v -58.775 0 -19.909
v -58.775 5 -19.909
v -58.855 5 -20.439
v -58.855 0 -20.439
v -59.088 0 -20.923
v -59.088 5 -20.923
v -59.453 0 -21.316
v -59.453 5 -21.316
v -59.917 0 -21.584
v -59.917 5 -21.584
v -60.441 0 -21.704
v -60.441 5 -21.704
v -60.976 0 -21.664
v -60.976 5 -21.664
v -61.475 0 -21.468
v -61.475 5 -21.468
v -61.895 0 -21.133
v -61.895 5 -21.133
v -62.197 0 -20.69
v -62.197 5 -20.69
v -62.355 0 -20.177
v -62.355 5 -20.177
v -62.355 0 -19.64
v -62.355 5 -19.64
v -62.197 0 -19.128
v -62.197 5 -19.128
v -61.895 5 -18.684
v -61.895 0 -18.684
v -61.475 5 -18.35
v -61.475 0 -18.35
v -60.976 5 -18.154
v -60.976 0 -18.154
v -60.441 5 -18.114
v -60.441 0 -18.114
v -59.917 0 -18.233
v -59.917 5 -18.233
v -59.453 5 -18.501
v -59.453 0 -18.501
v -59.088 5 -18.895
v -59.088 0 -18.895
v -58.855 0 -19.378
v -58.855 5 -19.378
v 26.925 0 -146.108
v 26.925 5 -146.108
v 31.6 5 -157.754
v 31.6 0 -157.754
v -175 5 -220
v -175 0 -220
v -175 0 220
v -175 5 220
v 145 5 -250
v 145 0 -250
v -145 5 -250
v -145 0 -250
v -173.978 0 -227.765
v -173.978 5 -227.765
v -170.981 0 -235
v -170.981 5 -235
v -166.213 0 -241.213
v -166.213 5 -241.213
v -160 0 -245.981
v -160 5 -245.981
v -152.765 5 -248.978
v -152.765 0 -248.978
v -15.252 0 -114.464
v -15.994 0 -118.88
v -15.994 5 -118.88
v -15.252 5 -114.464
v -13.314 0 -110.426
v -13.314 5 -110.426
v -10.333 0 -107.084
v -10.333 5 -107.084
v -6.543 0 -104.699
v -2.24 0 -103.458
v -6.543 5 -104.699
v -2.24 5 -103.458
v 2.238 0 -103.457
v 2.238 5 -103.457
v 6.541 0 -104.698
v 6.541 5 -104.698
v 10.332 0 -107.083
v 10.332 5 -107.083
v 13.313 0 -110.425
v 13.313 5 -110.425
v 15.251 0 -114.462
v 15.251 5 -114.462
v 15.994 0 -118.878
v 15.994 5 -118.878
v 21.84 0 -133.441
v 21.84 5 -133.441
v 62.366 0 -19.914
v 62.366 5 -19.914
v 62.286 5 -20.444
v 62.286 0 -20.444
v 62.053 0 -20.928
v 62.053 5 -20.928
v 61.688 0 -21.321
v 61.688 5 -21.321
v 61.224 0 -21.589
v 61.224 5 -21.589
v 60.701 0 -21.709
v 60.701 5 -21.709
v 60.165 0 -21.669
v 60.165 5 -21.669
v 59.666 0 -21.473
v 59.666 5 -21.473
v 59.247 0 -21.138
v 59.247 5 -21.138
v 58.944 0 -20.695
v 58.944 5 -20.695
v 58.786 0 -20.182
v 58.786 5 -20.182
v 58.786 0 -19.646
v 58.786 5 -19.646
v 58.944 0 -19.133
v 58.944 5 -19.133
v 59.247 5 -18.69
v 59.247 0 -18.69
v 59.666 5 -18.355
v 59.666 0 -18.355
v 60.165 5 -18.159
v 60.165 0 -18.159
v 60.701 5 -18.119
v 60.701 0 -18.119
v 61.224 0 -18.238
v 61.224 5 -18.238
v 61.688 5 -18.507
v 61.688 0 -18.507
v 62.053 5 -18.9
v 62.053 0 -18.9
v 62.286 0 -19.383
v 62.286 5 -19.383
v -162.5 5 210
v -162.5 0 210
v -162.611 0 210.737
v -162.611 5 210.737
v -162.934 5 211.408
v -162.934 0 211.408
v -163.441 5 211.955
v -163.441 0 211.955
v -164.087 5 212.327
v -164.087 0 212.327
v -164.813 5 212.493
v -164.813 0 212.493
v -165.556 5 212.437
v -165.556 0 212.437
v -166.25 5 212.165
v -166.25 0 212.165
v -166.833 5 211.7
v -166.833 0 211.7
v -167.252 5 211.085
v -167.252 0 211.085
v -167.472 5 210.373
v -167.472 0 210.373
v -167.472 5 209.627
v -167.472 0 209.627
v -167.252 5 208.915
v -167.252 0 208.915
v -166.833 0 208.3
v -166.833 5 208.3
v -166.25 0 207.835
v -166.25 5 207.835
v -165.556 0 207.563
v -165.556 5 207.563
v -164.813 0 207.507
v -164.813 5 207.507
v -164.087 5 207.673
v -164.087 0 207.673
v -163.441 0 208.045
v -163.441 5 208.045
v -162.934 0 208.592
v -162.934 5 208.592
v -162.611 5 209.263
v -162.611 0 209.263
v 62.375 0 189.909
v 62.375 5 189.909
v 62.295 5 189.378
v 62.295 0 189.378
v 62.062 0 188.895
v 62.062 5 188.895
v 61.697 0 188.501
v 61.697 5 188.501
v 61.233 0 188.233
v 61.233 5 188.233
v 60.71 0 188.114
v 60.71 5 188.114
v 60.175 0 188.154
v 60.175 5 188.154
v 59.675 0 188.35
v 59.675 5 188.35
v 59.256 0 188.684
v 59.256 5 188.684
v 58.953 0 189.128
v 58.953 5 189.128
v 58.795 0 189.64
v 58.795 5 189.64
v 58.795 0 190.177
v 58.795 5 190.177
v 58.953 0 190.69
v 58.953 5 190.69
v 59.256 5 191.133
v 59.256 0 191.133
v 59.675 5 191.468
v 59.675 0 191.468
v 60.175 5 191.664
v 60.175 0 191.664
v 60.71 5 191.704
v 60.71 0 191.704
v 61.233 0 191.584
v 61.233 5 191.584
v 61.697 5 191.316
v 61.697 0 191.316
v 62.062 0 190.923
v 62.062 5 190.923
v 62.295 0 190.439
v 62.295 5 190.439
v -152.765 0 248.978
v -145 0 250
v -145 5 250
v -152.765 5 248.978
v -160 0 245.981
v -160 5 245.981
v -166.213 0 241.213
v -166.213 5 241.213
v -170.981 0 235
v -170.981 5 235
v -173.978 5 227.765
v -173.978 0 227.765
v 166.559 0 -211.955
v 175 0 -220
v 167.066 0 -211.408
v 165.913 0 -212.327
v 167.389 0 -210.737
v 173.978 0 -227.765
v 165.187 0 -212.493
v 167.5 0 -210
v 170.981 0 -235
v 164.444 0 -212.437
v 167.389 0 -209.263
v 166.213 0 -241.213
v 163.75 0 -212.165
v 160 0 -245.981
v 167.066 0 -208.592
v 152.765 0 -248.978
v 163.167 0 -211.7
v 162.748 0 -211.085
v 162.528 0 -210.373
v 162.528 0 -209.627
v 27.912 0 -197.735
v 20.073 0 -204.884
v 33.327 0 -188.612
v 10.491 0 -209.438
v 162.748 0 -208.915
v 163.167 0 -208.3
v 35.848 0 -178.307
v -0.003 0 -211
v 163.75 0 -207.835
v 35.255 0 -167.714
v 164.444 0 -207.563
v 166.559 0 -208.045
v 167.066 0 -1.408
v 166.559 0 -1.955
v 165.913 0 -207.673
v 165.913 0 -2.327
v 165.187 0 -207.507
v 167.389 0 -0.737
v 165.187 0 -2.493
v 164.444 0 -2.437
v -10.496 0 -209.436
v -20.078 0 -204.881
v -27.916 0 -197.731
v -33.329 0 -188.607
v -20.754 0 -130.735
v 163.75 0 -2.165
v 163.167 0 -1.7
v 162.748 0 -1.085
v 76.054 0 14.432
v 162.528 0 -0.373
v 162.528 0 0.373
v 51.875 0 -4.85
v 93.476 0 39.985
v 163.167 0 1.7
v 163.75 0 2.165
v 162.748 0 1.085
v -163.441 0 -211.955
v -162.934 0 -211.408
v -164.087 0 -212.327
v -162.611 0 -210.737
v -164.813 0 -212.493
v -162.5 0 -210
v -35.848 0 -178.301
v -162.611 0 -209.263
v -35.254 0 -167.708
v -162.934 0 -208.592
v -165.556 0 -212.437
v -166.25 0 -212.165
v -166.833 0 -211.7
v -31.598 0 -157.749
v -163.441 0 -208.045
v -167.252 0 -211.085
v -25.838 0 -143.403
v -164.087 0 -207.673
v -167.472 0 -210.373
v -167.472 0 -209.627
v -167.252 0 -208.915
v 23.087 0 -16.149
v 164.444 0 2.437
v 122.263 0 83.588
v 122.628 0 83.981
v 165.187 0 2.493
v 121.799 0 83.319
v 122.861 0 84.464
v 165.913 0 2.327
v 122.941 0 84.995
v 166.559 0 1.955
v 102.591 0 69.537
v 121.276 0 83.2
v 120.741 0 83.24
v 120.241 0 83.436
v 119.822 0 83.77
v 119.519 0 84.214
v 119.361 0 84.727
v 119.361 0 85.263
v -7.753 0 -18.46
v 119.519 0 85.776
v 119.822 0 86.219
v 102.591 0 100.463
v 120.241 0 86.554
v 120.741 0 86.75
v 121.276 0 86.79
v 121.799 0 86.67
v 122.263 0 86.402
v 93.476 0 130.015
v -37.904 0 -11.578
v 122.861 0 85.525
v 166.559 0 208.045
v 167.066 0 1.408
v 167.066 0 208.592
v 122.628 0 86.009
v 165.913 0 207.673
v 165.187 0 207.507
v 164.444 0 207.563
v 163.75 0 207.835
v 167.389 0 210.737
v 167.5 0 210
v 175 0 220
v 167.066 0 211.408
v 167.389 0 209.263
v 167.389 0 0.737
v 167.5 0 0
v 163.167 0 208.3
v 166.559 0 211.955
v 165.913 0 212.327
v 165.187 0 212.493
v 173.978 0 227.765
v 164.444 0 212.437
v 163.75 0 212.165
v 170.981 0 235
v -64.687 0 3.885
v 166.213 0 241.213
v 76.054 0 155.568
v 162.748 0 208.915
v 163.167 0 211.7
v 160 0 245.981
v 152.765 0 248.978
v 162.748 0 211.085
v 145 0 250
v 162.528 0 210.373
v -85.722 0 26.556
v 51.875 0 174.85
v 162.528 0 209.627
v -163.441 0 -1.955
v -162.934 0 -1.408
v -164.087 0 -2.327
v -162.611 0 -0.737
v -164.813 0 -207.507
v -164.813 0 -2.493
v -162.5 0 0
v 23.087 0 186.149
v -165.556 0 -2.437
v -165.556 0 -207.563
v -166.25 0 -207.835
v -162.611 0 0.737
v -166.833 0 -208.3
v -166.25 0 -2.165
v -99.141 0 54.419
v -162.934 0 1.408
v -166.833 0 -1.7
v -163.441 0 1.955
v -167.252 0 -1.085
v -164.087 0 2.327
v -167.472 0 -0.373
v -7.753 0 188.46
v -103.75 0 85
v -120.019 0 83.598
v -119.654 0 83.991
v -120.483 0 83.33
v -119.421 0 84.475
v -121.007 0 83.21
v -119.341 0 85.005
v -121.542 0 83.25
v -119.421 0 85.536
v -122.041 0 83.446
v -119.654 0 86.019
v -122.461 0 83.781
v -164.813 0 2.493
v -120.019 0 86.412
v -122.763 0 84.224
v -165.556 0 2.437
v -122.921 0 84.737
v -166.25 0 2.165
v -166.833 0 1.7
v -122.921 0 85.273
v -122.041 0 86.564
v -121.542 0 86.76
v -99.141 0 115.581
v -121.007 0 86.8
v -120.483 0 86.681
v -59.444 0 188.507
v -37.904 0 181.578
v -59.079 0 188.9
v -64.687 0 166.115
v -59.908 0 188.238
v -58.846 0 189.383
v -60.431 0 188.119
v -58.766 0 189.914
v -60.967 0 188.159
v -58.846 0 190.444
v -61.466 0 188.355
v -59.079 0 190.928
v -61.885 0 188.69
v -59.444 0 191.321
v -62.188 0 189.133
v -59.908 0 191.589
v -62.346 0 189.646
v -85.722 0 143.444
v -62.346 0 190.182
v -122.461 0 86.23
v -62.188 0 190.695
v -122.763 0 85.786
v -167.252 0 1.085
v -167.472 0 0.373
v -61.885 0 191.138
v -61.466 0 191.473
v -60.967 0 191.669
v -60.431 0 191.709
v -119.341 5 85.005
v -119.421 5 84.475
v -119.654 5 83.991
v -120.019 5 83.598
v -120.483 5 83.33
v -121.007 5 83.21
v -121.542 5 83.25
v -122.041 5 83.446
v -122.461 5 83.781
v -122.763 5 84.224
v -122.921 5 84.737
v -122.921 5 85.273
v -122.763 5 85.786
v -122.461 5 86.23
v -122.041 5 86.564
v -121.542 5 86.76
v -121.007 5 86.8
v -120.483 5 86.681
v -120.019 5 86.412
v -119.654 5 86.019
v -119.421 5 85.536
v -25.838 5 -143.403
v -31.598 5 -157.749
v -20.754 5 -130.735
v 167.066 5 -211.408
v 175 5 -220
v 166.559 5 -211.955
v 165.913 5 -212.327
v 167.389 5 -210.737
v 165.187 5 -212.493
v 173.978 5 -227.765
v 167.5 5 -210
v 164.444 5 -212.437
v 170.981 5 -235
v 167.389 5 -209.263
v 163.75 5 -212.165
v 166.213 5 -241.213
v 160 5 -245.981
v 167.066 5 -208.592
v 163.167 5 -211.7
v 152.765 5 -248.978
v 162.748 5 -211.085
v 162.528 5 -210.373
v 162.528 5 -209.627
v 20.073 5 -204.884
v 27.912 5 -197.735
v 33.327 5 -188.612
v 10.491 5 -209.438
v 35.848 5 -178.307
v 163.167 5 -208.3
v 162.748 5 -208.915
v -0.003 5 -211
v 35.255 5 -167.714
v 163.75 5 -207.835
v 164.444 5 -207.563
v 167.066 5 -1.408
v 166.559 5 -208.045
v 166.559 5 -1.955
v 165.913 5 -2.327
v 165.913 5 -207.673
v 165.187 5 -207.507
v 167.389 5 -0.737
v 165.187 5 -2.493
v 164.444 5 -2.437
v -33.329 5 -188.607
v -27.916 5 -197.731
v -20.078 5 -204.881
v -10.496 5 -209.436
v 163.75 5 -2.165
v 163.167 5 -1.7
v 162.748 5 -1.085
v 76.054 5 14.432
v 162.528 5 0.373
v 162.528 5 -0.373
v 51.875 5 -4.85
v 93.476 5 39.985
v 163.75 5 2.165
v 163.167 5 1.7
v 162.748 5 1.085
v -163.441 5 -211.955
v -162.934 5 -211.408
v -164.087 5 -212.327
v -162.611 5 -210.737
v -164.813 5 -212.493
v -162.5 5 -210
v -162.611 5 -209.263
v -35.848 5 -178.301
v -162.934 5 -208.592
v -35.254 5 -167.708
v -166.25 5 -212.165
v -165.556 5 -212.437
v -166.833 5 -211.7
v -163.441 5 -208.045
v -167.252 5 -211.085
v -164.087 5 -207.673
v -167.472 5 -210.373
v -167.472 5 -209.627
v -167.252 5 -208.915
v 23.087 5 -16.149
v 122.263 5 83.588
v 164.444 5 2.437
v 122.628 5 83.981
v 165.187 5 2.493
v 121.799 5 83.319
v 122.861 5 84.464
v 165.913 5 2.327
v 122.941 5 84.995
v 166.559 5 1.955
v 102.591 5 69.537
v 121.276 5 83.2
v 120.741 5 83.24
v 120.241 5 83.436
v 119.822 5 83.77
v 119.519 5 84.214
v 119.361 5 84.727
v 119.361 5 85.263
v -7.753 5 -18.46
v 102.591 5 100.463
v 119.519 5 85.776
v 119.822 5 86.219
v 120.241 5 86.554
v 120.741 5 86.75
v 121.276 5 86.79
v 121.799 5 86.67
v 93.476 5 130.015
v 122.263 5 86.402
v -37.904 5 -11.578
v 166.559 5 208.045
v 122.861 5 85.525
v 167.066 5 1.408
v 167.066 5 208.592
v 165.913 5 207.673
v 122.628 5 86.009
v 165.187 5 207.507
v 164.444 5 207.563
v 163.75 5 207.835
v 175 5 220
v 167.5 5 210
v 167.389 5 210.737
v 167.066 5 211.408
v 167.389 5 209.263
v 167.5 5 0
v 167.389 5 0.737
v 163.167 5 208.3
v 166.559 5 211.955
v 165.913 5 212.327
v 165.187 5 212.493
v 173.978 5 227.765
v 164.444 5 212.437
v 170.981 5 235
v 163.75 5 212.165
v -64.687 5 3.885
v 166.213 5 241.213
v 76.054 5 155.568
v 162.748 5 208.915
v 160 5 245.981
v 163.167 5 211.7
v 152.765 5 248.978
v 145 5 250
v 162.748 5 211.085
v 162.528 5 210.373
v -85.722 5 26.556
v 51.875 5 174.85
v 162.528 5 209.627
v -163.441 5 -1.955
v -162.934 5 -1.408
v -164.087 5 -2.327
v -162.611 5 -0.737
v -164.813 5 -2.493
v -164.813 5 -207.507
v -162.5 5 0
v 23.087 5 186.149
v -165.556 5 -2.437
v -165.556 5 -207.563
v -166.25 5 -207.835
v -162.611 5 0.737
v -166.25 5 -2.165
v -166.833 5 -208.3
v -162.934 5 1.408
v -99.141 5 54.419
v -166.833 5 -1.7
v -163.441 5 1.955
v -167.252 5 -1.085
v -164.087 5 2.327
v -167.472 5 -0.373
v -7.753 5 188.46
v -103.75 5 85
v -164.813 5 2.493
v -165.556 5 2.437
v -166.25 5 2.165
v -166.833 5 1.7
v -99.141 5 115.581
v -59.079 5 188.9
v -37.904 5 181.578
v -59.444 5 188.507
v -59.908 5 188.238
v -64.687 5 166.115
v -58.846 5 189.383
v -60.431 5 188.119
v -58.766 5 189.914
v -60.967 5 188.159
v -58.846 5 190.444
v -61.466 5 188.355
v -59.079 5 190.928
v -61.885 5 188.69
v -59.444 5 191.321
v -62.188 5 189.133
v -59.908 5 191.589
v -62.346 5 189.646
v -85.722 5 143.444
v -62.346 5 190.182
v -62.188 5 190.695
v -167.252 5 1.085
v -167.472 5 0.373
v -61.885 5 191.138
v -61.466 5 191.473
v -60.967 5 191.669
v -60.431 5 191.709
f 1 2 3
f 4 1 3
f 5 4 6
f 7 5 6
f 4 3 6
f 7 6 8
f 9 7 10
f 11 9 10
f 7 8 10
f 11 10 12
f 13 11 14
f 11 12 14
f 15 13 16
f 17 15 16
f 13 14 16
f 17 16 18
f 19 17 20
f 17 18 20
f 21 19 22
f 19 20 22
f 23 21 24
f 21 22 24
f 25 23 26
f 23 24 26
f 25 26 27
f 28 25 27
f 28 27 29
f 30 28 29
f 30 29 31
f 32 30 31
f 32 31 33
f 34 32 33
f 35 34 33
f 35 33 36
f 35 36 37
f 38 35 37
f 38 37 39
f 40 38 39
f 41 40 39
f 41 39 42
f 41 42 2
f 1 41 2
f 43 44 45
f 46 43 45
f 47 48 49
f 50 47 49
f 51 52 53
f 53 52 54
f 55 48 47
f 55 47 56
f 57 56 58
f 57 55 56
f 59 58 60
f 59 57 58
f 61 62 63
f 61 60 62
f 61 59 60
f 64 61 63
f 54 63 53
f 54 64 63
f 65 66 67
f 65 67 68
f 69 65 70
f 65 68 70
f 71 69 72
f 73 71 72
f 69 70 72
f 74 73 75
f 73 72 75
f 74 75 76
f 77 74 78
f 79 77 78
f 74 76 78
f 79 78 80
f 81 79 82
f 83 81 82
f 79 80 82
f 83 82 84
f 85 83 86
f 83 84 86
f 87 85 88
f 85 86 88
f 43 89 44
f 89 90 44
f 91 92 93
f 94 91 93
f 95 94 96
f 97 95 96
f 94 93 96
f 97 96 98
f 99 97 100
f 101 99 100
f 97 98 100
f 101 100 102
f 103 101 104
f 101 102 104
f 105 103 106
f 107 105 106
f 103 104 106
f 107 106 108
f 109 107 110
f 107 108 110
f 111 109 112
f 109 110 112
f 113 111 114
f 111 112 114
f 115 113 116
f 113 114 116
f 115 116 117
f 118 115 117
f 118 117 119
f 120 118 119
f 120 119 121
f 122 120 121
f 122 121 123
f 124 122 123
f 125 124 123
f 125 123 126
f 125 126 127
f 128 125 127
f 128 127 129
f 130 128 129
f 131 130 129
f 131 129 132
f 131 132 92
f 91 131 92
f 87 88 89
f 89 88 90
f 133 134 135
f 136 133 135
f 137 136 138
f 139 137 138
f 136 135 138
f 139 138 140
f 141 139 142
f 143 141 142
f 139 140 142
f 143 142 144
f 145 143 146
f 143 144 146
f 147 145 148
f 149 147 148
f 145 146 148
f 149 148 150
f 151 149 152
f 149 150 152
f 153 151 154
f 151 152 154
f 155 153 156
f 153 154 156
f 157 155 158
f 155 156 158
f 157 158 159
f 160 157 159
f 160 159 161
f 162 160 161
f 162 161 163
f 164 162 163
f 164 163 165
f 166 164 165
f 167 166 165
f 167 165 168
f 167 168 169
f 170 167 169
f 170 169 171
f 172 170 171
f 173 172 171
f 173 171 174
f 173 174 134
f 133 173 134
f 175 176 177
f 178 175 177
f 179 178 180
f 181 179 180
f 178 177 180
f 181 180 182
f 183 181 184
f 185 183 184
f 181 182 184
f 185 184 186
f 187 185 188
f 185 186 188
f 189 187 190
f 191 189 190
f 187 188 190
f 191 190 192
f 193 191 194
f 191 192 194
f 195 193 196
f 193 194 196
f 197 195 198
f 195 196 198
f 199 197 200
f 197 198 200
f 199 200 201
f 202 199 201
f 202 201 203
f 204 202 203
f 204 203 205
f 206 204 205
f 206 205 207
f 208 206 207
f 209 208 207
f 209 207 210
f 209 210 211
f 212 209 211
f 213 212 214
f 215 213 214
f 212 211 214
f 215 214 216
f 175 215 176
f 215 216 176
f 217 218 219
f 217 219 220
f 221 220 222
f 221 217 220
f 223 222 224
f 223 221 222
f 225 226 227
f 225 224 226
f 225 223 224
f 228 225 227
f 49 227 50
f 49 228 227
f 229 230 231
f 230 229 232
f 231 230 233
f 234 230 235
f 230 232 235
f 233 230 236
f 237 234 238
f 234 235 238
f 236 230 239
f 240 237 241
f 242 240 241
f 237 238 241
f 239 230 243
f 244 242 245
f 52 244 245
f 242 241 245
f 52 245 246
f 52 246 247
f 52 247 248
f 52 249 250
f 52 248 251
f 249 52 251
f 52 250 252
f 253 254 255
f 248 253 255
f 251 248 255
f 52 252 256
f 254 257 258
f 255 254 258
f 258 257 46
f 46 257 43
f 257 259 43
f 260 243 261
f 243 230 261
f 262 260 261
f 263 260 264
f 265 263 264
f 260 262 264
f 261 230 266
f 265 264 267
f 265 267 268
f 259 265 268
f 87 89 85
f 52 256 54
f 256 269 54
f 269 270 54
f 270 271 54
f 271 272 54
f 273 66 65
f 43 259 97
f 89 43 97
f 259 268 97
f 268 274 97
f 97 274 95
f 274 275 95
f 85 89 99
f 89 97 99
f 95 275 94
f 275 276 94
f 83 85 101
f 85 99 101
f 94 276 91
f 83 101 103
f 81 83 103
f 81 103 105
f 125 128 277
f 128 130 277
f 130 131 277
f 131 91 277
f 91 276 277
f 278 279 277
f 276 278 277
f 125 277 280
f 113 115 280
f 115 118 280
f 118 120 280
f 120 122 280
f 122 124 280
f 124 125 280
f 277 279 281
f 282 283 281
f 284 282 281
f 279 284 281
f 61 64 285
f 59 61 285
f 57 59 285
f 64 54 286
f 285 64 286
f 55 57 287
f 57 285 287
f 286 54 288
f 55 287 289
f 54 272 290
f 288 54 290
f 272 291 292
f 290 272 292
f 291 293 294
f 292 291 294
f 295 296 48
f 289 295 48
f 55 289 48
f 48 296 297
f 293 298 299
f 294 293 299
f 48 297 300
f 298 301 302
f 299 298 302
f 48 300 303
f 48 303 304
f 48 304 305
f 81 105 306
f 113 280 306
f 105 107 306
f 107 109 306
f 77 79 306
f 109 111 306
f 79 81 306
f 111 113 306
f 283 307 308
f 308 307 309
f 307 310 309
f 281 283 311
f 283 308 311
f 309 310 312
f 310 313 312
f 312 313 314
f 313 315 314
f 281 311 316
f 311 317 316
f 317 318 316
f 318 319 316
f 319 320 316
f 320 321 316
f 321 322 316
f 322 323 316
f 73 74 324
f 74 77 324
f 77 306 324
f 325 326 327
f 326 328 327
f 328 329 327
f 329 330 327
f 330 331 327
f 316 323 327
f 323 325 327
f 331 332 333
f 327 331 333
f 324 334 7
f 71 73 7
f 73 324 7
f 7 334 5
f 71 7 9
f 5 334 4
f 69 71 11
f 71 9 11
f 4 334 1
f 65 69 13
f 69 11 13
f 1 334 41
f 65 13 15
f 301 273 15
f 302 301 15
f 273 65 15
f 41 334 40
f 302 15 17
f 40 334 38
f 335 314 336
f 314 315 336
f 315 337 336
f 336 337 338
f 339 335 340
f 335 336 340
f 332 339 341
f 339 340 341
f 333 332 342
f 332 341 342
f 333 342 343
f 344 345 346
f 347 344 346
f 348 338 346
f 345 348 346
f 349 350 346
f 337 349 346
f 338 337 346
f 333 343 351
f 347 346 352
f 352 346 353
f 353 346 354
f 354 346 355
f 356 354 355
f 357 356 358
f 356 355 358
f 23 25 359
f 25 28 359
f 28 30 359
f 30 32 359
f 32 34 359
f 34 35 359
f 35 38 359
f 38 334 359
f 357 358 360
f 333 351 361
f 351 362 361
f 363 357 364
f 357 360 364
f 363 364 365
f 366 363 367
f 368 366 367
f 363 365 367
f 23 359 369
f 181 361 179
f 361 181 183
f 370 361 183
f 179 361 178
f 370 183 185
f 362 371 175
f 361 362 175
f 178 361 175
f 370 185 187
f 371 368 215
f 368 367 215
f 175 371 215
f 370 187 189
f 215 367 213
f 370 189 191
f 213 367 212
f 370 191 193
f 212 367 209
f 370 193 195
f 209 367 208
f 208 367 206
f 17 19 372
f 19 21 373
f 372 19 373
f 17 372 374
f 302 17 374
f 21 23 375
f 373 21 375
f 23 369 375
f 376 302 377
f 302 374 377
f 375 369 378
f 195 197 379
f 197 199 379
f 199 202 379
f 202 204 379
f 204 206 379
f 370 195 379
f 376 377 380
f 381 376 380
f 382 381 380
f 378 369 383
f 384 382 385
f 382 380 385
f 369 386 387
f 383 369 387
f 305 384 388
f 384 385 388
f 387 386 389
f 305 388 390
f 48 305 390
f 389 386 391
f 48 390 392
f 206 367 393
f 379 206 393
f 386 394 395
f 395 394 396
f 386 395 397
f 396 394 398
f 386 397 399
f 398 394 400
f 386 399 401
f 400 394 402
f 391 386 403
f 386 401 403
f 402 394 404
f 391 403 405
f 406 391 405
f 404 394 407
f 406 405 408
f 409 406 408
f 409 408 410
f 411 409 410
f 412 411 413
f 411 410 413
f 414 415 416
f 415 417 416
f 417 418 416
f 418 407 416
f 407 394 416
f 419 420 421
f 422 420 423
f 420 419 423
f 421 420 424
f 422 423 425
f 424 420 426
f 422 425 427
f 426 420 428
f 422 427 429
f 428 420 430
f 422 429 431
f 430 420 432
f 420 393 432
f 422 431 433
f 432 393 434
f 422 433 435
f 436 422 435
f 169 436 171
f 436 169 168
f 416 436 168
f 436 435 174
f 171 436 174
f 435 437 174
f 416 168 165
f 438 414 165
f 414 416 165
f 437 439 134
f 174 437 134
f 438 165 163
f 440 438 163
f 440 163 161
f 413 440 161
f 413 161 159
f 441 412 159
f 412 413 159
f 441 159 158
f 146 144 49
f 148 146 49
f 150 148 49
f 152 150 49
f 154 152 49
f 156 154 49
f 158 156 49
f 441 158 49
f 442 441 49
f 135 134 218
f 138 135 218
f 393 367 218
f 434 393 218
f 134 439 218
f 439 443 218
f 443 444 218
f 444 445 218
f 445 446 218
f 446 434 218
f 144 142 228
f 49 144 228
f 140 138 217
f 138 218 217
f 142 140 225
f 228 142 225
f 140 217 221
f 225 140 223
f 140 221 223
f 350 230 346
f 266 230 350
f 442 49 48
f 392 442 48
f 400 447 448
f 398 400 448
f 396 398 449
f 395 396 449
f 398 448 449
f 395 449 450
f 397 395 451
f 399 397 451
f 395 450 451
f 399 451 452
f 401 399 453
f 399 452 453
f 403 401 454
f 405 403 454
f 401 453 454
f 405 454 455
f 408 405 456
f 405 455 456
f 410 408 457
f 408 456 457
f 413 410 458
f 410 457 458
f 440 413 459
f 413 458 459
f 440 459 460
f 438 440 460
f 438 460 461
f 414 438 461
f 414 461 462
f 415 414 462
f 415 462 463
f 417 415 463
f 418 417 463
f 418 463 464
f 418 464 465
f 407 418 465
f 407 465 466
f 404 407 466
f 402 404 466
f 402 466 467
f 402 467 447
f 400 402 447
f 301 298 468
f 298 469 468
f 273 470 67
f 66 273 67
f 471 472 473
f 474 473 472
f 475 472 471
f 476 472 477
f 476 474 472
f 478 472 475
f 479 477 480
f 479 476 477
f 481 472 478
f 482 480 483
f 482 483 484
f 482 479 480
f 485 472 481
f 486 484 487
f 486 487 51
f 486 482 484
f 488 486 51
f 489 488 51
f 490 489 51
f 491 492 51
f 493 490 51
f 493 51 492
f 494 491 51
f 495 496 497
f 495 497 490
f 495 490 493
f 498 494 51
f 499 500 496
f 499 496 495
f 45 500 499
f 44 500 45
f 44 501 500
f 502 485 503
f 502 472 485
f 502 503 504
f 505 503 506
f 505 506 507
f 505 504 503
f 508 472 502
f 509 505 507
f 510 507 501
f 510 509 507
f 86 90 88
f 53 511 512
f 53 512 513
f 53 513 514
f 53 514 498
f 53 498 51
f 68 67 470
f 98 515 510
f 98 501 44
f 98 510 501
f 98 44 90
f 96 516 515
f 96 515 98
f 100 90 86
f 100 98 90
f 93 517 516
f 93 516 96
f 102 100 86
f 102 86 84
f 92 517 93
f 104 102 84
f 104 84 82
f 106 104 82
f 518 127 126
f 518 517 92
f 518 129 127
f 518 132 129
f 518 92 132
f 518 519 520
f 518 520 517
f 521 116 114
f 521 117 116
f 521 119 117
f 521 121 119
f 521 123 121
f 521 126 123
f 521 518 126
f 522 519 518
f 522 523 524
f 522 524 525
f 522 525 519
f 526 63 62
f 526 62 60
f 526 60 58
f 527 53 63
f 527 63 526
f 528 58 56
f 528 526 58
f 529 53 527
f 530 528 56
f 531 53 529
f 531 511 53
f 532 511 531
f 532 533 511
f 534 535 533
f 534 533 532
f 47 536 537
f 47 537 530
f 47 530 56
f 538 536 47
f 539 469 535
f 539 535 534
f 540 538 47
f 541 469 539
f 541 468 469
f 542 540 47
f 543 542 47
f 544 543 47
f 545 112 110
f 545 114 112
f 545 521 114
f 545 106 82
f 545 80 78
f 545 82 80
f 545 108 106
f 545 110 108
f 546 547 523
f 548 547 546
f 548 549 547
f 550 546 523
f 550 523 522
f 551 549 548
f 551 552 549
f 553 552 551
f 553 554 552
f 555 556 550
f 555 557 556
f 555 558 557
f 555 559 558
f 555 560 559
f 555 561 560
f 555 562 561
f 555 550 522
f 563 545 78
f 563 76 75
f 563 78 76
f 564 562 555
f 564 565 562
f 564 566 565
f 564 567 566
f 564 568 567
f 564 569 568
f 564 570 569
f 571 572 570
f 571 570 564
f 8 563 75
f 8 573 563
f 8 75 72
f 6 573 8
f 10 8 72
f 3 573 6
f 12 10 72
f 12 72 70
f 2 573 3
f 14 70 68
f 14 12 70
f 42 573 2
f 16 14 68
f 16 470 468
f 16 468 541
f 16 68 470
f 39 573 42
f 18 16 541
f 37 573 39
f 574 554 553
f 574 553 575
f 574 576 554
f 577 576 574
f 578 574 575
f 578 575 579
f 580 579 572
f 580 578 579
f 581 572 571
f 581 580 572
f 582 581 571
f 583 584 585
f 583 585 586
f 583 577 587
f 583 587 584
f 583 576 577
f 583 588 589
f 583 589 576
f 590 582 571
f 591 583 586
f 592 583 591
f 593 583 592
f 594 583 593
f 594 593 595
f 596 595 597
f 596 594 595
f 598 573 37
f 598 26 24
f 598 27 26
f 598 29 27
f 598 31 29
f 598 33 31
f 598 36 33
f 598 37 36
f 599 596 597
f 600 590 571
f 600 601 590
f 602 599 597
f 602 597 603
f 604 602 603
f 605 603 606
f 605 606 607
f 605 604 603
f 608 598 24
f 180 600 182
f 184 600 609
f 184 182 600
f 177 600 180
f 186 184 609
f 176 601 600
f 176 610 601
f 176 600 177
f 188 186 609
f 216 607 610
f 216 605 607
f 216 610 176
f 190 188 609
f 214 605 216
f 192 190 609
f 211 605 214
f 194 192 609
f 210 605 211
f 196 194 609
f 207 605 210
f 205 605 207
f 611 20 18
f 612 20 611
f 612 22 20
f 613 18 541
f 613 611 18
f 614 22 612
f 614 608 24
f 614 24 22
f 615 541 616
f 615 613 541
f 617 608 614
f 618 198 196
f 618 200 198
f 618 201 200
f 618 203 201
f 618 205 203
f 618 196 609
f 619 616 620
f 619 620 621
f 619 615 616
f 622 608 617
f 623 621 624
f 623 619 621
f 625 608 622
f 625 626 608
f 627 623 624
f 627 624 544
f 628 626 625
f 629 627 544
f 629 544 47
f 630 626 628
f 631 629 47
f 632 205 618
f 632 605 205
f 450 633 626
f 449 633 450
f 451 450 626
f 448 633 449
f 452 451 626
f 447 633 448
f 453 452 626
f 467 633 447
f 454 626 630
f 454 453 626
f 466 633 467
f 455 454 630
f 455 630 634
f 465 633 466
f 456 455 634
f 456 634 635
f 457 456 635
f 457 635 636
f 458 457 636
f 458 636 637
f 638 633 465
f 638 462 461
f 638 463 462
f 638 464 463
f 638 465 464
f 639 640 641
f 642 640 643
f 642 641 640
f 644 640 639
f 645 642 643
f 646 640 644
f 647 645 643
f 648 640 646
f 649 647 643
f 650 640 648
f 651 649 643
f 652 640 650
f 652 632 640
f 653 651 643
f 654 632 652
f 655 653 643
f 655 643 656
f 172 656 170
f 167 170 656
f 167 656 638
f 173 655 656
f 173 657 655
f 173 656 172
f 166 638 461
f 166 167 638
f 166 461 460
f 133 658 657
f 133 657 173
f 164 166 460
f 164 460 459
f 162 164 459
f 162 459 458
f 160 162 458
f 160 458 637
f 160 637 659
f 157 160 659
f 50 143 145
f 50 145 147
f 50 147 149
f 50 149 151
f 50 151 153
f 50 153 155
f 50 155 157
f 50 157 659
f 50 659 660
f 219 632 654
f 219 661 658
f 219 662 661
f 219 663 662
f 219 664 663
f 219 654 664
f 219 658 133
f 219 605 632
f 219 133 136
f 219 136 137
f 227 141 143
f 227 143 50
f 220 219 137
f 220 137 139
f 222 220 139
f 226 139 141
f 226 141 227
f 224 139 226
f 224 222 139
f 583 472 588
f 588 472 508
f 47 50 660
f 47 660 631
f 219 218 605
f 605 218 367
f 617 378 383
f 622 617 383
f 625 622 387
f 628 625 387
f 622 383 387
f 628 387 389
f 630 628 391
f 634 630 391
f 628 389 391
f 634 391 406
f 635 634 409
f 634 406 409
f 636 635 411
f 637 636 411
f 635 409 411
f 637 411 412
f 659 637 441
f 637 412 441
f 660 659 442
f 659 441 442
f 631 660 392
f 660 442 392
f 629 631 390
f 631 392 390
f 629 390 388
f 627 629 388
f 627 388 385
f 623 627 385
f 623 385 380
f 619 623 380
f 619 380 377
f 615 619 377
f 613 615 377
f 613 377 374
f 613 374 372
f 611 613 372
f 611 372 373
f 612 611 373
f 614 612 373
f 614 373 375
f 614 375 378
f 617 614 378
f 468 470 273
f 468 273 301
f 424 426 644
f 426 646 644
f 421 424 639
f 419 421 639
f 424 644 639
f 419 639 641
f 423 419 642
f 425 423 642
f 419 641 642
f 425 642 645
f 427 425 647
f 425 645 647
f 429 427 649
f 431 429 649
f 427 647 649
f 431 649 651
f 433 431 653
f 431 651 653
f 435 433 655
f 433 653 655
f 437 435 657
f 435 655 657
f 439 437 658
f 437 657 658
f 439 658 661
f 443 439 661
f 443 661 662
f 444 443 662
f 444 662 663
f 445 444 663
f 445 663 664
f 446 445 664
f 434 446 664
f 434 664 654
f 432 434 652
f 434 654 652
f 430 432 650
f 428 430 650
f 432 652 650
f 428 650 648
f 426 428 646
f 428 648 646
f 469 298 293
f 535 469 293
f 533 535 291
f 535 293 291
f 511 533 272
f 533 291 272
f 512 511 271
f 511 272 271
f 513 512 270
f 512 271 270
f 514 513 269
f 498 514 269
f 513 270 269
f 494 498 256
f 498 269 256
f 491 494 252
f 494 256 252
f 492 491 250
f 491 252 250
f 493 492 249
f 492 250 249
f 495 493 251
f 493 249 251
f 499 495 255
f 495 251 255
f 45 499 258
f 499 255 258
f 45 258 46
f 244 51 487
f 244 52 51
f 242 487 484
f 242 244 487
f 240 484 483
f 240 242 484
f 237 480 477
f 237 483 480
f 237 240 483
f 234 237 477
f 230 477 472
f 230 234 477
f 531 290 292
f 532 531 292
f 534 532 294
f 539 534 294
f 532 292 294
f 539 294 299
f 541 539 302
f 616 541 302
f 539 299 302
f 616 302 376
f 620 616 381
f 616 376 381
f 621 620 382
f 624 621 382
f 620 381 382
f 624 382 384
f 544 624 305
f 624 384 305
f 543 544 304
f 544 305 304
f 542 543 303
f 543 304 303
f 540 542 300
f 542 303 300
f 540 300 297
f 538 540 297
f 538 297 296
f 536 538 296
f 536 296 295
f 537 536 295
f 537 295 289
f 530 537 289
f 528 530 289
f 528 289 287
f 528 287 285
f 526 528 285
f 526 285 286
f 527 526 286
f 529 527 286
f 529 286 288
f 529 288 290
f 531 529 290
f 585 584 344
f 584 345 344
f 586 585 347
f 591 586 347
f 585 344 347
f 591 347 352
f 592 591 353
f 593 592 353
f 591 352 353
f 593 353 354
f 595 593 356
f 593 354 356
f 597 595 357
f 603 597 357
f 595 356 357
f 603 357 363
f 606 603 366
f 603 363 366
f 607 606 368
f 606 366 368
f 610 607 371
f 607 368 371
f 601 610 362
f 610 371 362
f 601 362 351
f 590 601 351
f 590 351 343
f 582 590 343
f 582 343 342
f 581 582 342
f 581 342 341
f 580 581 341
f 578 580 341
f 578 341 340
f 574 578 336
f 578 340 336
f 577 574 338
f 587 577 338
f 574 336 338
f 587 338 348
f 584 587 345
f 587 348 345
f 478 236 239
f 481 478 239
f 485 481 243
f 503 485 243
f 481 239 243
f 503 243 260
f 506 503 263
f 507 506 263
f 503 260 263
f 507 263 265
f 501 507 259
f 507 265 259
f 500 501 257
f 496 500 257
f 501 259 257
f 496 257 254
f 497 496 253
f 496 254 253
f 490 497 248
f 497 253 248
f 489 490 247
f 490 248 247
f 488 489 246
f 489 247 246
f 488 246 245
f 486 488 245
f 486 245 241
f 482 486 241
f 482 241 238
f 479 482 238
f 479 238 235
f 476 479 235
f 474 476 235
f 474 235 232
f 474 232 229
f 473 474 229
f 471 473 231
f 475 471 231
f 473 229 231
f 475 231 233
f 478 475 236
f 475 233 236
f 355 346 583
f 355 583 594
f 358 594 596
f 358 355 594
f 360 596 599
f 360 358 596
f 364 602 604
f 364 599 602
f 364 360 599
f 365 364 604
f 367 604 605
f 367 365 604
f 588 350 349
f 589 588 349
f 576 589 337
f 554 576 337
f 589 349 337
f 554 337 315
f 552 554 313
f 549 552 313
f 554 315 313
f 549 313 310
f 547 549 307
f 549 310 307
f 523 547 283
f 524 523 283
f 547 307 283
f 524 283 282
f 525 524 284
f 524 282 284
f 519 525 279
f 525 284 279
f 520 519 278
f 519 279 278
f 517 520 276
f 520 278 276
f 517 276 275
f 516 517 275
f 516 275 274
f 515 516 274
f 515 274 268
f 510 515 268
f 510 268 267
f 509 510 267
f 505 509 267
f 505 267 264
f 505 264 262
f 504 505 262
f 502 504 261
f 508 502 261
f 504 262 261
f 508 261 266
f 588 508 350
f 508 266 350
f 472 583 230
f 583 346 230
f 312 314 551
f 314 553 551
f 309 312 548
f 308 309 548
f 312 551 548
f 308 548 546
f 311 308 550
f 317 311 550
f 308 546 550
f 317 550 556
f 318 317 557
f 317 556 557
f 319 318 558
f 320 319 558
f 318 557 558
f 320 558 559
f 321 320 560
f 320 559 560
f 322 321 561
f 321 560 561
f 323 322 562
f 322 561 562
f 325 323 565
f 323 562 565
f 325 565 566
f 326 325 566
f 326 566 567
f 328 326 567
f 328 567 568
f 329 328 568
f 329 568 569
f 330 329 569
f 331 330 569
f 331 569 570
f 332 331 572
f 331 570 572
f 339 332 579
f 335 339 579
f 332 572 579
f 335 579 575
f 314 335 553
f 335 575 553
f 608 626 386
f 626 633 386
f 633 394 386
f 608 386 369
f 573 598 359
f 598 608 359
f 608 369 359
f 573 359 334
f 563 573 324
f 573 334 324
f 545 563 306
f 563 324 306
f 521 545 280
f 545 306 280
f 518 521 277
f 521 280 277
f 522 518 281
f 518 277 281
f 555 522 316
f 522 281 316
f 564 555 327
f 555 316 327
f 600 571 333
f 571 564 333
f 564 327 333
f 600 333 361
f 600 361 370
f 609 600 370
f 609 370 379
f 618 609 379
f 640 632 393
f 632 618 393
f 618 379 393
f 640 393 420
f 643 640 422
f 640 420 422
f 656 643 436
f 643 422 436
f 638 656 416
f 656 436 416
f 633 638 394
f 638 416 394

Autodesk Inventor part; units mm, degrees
ref_plane "YZ Plane" through (0, 0, 0) normal (1, 0, 0) x (0, 1, 0)
ref_plane "XZ Plane" through (0, 0, 0) normal (0, 1, 0) x (-1, 0, 0)
ref_plane "XY Plane" through (0, 0, 0) normal (0, 0, 1) x (1, 0, 0)
sketch "스케치1" plane through (0, 0, 0) normal (0, 1, 0) x (-1, 0, 0)
  line L0 (145, 250) -> (-145, 250)
  line L1 (-175, 220) -> (-175, -220)
  line L2 (-145, -250) -> (145, -250)
  line L3 (175, -220) -> (175, 220)
  line L4 (175, 250) -> (-175, -250) construction
  line L5 (-175, 250) -> (175, -250) construction
  circle A0 centre (0, -175) radius 36
  arc A1 (145, -250) -> (175, -220) centre (145, -220) ccw
  arc A2 (-175, -220) -> (-145, -250) centre (-145, -220) ccw
  arc A3 (-145, 250) -> (-175, 220) centre (-145, 220) ccw
  arc A4 (175, 220) -> (145, 250) centre (145, 220) ccw
  circle A5 centre (0, 85) radius 103.75
  point P0 (0, 0)
  dimension "d0" = 350
  dimension "d1" = 500
  dimension "d2" = 72
  dimension "d3" = 30
  dimension "d4" = 75
  dimension "d5" = 207.5
  dimension "d7" = 165
extrude "돌출1" add sketch "스케치1" along normal blind 5
sketch "스케치2" plane through (0, 0, 0) normal (0, -1, 0) x (1, 0, 0)
  line L0 (-145, 250) -> (145, 250) projected
  line L1 (-175, -220) -> (-175, 220) projected
  line L2 (145, -250) -> (-145, -250) projected
  line L3 (175, 220) -> (175, -220) projected
  circle A0 centre (165, 210) radius 2.5
  line L4 (0, 250) -> (0, -250) construction
  line L5 (-175, 0) -> (175, 0) construction
  circle A1 centre (165, -210) radius 2.5
  circle A2 centre (165, 0) radius 2.5
  circle A3 centre (-165, 210) radius 2.5
  circle A4 centre (-165, -210) radius 2.5
  circle A5 centre (-165, 0) radius 2.5
  point P0 (0, 0)
  dimension "d11" = 5
  dimension "d12" = 40
  dimension "d13" = 10
  dimension "d14" = 5
  dimension "d15" = 10
extrude "돌출2" cut sketch "스케치2" against normal through all
sketch "스케치3" plane through (0, 5, 0) normal (0, 1, 0) x (1, 0, 0)
  circle A0 centre (0, 175) radius 36 projected
  circle A1 centre (0, 175) radius 33.15
  line L0 (0, 175) -> (0, 119.3)
  circle A2 centre (-55.0502, 292.3468) radius 36
  line L1 (26.9254, 146.1085) -> (31.6003, 157.7541)
  line L2 (15.9944, 118.8781) -> (21.8404, 133.441)
  arc A3 (-15.9945, 118.88) -> (15.9944, 118.8781) centre (0, 119.3) ccw
  line L3 (-20.7535, 130.7351) -> (-15.9945, 118.88)
  line L4 (-31.5976, 157.7491) -> (-25.8385, 143.4026)
  circle A4 centre (-55.0502, 292.3468) radius 36
  circle A5 centre (-55.0502, 292.3468) radius 36
  line L5 (-20.7535, 130.7351) -> (-25.8385, 143.4026)
  line L6 (21.8404, 133.441) -> (26.9254, 146.1085)
  arc A6 (-13.9206, 113.7129) -> (13.92, 113.7112) centre (0, 119.3) ccw construction
  line L7 (13.92, 113.7112) -> (15.9944, 118.8781) construction
  line L8 (-13.9206, 113.7129) -> (-15.9945, 118.88) construction
  point P0 (0, 0)
  dimension "d18" = 12.7747
  dimension "d19" = 13.65
  dimension "d21" = 16
  dimension "d22" = 15
  dimension "d23" = 176.985
  dimension "d24" = 136.256
  dimension "d25" = 5.5678
  dimension "d26" = 5.5678
  dimension "d27" = 55.7
  dimension "d28" = 15.6925
  dimension "d29" = 13.65
  dimension "d31" = 43.744
  dimension "d32" = 43.744
  dimension "d33" = 43.744
  dimension "d34" = 12.5489
  dimension "d35" = 15.4593
extrude "돌출3" cut sketch "스케치3" against normal blind 10 contours A0 L1 L6 L2 A3 L3 L5 L4
sketch "스케치4" plane through (0, 5, 0) normal (0, 1, 0) x (1, 0, 0)
  circle A0 centre (0, -85) radius 103.75 projected
  circle A1 centre (-0.0796, -85.0052) radius 104.02 projected
  line L0 (-0.0796, -85.0052) -> (-121.1411, -85.0052) construction
  line L1 (-0.0796, -85.0052) -> (120.9819, -85.0052) construction
  circle A2 centre (-121.1411, -85.0052) radius 1.8
  circle A3 centre (-60.566, -189.9139) radius 1.8
  circle A4 centre (60.5751, -189.9087) radius 1.8
  circle A5 centre (121.1411, -84.9948) radius 1.8
  circle A6 centre (60.566, 19.9139) radius 1.8
  circle A7 centre (-60.5751, 19.9087) radius 1.8
  point P0 (0, 0)
  dimension "d38" = 121.0615
  dimension "d39" = 180
  dimension "d40" = 3.6
  dimension "d43" = 360
extrude "돌출4" cut sketch "스케치4" against normal blind 10 contours A2 | A3 | A4 | A5 | A6 | A7
properties part number "부품8"
